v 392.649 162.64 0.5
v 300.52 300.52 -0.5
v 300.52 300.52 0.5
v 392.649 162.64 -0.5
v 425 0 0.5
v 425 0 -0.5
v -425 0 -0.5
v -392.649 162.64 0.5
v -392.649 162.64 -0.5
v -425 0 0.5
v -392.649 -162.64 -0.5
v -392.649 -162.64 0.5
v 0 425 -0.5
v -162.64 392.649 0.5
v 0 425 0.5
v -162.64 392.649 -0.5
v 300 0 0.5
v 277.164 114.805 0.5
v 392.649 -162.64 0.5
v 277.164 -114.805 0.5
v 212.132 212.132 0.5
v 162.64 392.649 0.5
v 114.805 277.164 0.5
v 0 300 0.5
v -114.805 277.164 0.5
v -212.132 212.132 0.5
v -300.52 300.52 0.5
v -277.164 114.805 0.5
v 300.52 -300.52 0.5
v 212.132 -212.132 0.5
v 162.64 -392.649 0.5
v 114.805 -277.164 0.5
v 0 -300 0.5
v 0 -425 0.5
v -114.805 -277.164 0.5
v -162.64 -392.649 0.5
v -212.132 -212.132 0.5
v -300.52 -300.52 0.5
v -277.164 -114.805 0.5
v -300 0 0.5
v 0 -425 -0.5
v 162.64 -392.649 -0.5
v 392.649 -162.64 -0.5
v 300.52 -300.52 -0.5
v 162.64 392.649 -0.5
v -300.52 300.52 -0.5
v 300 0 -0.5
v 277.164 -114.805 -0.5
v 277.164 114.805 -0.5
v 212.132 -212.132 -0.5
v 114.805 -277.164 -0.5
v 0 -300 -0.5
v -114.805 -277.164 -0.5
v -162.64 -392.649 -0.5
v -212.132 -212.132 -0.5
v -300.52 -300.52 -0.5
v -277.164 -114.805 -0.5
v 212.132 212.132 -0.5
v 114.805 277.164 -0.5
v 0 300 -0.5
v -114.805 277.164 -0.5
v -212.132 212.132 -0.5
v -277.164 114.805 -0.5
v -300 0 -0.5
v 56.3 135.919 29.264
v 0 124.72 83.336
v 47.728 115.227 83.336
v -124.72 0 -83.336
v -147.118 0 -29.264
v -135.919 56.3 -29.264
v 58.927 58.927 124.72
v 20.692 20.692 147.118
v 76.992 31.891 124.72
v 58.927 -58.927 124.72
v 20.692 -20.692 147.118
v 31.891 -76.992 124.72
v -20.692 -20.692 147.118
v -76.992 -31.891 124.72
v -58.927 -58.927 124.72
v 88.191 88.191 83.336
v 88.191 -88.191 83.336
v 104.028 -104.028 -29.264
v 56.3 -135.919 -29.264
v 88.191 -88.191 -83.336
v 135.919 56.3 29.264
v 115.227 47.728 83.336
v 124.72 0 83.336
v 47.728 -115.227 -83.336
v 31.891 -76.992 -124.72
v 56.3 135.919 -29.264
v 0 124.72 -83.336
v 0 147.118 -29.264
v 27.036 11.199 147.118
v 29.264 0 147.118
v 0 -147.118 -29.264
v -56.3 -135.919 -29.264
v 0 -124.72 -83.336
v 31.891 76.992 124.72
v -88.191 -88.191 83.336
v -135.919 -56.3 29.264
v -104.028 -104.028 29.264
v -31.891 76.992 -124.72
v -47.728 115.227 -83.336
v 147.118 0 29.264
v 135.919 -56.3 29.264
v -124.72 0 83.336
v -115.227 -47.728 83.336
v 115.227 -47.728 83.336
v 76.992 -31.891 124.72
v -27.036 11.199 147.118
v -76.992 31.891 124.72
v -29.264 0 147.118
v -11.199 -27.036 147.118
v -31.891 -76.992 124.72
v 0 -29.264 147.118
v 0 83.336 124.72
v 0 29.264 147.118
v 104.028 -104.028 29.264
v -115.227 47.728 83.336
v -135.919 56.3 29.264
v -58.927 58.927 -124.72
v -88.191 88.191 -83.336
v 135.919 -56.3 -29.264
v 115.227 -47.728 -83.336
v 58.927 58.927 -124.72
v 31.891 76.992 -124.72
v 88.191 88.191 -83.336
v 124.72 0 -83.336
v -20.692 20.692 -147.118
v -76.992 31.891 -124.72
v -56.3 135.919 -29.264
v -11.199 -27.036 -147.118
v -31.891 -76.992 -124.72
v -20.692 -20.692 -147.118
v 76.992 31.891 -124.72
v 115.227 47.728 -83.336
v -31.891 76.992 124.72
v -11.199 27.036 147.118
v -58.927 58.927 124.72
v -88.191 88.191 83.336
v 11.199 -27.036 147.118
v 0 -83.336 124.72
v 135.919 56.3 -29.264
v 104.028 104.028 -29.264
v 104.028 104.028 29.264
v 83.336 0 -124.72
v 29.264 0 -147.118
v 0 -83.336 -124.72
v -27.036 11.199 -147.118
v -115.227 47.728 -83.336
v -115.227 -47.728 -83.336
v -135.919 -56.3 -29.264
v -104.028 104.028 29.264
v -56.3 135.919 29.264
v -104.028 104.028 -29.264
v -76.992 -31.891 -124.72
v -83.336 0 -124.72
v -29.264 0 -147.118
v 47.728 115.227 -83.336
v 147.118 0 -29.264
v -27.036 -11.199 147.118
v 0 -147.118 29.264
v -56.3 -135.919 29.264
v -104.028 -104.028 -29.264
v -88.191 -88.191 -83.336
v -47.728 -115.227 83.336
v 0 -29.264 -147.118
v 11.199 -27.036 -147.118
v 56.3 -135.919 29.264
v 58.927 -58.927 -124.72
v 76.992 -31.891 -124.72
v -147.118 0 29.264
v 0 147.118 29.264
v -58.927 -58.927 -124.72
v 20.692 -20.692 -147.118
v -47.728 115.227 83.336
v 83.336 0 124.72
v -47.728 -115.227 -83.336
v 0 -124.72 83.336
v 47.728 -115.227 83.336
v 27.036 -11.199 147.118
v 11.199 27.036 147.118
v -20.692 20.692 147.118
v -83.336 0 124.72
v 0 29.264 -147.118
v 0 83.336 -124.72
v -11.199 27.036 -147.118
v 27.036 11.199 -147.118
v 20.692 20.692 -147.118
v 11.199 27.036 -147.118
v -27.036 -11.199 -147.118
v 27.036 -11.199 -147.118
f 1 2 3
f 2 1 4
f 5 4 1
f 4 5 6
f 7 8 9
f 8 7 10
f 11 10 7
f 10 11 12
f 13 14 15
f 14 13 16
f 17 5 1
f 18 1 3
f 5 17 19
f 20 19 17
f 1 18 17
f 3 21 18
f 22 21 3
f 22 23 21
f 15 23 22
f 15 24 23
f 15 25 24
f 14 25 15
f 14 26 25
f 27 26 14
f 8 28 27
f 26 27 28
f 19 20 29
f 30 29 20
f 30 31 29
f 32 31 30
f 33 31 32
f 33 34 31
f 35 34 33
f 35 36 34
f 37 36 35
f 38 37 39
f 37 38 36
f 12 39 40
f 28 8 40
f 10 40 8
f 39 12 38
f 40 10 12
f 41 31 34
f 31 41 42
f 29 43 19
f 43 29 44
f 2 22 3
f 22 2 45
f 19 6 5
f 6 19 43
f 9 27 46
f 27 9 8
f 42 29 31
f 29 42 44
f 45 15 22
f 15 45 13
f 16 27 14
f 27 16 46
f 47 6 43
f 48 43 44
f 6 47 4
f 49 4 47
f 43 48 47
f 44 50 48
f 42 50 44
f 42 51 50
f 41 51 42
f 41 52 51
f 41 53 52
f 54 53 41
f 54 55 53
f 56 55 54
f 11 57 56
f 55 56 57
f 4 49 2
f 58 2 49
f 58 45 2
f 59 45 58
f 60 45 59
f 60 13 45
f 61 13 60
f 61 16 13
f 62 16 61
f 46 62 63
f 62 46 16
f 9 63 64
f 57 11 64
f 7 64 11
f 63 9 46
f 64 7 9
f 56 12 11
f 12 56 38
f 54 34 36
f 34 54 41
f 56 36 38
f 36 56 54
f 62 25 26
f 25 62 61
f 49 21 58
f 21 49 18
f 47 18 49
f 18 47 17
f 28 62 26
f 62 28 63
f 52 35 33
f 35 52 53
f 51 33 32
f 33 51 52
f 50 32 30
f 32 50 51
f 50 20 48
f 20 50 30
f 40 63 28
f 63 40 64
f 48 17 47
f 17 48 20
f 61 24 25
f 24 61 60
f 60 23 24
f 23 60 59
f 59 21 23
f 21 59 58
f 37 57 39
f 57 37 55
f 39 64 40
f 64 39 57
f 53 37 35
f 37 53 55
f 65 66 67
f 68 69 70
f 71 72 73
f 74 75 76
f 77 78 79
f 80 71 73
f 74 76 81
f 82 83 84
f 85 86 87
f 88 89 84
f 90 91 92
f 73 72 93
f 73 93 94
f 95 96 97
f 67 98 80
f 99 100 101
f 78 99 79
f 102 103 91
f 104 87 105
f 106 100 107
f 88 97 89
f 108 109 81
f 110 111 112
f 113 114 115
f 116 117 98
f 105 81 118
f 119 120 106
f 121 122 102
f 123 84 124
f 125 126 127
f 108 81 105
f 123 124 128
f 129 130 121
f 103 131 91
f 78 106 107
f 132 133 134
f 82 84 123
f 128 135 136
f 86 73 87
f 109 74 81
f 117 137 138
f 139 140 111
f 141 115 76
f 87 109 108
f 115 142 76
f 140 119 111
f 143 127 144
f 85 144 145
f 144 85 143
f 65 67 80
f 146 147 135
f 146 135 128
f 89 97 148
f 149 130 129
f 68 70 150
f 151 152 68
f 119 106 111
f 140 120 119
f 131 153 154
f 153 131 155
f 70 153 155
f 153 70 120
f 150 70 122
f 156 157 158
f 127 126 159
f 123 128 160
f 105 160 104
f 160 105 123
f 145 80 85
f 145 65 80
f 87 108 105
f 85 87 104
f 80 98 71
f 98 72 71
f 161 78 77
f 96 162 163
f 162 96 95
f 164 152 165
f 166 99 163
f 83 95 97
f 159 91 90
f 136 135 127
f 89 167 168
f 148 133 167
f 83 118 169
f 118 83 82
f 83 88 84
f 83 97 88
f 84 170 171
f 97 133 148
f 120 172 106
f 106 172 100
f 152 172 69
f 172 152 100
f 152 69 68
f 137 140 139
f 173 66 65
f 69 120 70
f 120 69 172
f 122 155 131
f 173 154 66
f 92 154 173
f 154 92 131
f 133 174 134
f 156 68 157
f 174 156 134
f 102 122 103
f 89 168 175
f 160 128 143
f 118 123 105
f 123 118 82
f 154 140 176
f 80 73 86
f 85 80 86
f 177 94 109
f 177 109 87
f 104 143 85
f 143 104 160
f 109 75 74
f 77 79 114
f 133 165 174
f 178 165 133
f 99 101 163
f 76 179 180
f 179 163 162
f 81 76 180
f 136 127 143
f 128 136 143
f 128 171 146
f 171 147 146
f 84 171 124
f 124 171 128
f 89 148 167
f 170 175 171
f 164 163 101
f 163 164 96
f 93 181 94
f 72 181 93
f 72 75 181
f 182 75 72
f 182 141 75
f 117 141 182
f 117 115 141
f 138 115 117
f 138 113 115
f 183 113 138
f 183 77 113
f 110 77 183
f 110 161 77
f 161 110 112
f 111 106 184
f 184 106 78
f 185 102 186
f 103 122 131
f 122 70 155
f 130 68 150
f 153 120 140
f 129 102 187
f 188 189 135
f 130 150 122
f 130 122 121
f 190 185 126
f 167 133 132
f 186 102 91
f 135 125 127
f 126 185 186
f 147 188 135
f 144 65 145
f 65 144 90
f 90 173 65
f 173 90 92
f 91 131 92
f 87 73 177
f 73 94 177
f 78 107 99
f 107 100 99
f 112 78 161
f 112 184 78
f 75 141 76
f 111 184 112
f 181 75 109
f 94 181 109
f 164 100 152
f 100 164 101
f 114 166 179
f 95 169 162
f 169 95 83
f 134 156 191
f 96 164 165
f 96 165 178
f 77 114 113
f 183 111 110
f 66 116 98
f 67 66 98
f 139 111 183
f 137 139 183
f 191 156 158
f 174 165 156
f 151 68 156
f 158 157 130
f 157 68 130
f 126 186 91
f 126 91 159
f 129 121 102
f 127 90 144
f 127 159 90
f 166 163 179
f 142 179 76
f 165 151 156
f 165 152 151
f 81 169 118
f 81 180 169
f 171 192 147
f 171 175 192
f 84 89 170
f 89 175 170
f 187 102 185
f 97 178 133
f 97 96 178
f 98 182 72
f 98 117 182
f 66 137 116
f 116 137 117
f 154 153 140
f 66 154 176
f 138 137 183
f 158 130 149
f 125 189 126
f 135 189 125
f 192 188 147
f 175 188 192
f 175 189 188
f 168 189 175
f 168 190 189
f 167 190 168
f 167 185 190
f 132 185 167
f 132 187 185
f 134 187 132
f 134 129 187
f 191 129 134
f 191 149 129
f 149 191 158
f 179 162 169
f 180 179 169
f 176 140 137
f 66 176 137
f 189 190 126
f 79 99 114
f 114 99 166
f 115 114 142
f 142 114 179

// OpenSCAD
$fn=16;
sphere(r = 150);

difference() {
	cylinder(h = 1, r1 = 425, r2 = 425, center = true);
	cylinder(h = 2, r1 = 300, r2 = 300, center = true);
}
